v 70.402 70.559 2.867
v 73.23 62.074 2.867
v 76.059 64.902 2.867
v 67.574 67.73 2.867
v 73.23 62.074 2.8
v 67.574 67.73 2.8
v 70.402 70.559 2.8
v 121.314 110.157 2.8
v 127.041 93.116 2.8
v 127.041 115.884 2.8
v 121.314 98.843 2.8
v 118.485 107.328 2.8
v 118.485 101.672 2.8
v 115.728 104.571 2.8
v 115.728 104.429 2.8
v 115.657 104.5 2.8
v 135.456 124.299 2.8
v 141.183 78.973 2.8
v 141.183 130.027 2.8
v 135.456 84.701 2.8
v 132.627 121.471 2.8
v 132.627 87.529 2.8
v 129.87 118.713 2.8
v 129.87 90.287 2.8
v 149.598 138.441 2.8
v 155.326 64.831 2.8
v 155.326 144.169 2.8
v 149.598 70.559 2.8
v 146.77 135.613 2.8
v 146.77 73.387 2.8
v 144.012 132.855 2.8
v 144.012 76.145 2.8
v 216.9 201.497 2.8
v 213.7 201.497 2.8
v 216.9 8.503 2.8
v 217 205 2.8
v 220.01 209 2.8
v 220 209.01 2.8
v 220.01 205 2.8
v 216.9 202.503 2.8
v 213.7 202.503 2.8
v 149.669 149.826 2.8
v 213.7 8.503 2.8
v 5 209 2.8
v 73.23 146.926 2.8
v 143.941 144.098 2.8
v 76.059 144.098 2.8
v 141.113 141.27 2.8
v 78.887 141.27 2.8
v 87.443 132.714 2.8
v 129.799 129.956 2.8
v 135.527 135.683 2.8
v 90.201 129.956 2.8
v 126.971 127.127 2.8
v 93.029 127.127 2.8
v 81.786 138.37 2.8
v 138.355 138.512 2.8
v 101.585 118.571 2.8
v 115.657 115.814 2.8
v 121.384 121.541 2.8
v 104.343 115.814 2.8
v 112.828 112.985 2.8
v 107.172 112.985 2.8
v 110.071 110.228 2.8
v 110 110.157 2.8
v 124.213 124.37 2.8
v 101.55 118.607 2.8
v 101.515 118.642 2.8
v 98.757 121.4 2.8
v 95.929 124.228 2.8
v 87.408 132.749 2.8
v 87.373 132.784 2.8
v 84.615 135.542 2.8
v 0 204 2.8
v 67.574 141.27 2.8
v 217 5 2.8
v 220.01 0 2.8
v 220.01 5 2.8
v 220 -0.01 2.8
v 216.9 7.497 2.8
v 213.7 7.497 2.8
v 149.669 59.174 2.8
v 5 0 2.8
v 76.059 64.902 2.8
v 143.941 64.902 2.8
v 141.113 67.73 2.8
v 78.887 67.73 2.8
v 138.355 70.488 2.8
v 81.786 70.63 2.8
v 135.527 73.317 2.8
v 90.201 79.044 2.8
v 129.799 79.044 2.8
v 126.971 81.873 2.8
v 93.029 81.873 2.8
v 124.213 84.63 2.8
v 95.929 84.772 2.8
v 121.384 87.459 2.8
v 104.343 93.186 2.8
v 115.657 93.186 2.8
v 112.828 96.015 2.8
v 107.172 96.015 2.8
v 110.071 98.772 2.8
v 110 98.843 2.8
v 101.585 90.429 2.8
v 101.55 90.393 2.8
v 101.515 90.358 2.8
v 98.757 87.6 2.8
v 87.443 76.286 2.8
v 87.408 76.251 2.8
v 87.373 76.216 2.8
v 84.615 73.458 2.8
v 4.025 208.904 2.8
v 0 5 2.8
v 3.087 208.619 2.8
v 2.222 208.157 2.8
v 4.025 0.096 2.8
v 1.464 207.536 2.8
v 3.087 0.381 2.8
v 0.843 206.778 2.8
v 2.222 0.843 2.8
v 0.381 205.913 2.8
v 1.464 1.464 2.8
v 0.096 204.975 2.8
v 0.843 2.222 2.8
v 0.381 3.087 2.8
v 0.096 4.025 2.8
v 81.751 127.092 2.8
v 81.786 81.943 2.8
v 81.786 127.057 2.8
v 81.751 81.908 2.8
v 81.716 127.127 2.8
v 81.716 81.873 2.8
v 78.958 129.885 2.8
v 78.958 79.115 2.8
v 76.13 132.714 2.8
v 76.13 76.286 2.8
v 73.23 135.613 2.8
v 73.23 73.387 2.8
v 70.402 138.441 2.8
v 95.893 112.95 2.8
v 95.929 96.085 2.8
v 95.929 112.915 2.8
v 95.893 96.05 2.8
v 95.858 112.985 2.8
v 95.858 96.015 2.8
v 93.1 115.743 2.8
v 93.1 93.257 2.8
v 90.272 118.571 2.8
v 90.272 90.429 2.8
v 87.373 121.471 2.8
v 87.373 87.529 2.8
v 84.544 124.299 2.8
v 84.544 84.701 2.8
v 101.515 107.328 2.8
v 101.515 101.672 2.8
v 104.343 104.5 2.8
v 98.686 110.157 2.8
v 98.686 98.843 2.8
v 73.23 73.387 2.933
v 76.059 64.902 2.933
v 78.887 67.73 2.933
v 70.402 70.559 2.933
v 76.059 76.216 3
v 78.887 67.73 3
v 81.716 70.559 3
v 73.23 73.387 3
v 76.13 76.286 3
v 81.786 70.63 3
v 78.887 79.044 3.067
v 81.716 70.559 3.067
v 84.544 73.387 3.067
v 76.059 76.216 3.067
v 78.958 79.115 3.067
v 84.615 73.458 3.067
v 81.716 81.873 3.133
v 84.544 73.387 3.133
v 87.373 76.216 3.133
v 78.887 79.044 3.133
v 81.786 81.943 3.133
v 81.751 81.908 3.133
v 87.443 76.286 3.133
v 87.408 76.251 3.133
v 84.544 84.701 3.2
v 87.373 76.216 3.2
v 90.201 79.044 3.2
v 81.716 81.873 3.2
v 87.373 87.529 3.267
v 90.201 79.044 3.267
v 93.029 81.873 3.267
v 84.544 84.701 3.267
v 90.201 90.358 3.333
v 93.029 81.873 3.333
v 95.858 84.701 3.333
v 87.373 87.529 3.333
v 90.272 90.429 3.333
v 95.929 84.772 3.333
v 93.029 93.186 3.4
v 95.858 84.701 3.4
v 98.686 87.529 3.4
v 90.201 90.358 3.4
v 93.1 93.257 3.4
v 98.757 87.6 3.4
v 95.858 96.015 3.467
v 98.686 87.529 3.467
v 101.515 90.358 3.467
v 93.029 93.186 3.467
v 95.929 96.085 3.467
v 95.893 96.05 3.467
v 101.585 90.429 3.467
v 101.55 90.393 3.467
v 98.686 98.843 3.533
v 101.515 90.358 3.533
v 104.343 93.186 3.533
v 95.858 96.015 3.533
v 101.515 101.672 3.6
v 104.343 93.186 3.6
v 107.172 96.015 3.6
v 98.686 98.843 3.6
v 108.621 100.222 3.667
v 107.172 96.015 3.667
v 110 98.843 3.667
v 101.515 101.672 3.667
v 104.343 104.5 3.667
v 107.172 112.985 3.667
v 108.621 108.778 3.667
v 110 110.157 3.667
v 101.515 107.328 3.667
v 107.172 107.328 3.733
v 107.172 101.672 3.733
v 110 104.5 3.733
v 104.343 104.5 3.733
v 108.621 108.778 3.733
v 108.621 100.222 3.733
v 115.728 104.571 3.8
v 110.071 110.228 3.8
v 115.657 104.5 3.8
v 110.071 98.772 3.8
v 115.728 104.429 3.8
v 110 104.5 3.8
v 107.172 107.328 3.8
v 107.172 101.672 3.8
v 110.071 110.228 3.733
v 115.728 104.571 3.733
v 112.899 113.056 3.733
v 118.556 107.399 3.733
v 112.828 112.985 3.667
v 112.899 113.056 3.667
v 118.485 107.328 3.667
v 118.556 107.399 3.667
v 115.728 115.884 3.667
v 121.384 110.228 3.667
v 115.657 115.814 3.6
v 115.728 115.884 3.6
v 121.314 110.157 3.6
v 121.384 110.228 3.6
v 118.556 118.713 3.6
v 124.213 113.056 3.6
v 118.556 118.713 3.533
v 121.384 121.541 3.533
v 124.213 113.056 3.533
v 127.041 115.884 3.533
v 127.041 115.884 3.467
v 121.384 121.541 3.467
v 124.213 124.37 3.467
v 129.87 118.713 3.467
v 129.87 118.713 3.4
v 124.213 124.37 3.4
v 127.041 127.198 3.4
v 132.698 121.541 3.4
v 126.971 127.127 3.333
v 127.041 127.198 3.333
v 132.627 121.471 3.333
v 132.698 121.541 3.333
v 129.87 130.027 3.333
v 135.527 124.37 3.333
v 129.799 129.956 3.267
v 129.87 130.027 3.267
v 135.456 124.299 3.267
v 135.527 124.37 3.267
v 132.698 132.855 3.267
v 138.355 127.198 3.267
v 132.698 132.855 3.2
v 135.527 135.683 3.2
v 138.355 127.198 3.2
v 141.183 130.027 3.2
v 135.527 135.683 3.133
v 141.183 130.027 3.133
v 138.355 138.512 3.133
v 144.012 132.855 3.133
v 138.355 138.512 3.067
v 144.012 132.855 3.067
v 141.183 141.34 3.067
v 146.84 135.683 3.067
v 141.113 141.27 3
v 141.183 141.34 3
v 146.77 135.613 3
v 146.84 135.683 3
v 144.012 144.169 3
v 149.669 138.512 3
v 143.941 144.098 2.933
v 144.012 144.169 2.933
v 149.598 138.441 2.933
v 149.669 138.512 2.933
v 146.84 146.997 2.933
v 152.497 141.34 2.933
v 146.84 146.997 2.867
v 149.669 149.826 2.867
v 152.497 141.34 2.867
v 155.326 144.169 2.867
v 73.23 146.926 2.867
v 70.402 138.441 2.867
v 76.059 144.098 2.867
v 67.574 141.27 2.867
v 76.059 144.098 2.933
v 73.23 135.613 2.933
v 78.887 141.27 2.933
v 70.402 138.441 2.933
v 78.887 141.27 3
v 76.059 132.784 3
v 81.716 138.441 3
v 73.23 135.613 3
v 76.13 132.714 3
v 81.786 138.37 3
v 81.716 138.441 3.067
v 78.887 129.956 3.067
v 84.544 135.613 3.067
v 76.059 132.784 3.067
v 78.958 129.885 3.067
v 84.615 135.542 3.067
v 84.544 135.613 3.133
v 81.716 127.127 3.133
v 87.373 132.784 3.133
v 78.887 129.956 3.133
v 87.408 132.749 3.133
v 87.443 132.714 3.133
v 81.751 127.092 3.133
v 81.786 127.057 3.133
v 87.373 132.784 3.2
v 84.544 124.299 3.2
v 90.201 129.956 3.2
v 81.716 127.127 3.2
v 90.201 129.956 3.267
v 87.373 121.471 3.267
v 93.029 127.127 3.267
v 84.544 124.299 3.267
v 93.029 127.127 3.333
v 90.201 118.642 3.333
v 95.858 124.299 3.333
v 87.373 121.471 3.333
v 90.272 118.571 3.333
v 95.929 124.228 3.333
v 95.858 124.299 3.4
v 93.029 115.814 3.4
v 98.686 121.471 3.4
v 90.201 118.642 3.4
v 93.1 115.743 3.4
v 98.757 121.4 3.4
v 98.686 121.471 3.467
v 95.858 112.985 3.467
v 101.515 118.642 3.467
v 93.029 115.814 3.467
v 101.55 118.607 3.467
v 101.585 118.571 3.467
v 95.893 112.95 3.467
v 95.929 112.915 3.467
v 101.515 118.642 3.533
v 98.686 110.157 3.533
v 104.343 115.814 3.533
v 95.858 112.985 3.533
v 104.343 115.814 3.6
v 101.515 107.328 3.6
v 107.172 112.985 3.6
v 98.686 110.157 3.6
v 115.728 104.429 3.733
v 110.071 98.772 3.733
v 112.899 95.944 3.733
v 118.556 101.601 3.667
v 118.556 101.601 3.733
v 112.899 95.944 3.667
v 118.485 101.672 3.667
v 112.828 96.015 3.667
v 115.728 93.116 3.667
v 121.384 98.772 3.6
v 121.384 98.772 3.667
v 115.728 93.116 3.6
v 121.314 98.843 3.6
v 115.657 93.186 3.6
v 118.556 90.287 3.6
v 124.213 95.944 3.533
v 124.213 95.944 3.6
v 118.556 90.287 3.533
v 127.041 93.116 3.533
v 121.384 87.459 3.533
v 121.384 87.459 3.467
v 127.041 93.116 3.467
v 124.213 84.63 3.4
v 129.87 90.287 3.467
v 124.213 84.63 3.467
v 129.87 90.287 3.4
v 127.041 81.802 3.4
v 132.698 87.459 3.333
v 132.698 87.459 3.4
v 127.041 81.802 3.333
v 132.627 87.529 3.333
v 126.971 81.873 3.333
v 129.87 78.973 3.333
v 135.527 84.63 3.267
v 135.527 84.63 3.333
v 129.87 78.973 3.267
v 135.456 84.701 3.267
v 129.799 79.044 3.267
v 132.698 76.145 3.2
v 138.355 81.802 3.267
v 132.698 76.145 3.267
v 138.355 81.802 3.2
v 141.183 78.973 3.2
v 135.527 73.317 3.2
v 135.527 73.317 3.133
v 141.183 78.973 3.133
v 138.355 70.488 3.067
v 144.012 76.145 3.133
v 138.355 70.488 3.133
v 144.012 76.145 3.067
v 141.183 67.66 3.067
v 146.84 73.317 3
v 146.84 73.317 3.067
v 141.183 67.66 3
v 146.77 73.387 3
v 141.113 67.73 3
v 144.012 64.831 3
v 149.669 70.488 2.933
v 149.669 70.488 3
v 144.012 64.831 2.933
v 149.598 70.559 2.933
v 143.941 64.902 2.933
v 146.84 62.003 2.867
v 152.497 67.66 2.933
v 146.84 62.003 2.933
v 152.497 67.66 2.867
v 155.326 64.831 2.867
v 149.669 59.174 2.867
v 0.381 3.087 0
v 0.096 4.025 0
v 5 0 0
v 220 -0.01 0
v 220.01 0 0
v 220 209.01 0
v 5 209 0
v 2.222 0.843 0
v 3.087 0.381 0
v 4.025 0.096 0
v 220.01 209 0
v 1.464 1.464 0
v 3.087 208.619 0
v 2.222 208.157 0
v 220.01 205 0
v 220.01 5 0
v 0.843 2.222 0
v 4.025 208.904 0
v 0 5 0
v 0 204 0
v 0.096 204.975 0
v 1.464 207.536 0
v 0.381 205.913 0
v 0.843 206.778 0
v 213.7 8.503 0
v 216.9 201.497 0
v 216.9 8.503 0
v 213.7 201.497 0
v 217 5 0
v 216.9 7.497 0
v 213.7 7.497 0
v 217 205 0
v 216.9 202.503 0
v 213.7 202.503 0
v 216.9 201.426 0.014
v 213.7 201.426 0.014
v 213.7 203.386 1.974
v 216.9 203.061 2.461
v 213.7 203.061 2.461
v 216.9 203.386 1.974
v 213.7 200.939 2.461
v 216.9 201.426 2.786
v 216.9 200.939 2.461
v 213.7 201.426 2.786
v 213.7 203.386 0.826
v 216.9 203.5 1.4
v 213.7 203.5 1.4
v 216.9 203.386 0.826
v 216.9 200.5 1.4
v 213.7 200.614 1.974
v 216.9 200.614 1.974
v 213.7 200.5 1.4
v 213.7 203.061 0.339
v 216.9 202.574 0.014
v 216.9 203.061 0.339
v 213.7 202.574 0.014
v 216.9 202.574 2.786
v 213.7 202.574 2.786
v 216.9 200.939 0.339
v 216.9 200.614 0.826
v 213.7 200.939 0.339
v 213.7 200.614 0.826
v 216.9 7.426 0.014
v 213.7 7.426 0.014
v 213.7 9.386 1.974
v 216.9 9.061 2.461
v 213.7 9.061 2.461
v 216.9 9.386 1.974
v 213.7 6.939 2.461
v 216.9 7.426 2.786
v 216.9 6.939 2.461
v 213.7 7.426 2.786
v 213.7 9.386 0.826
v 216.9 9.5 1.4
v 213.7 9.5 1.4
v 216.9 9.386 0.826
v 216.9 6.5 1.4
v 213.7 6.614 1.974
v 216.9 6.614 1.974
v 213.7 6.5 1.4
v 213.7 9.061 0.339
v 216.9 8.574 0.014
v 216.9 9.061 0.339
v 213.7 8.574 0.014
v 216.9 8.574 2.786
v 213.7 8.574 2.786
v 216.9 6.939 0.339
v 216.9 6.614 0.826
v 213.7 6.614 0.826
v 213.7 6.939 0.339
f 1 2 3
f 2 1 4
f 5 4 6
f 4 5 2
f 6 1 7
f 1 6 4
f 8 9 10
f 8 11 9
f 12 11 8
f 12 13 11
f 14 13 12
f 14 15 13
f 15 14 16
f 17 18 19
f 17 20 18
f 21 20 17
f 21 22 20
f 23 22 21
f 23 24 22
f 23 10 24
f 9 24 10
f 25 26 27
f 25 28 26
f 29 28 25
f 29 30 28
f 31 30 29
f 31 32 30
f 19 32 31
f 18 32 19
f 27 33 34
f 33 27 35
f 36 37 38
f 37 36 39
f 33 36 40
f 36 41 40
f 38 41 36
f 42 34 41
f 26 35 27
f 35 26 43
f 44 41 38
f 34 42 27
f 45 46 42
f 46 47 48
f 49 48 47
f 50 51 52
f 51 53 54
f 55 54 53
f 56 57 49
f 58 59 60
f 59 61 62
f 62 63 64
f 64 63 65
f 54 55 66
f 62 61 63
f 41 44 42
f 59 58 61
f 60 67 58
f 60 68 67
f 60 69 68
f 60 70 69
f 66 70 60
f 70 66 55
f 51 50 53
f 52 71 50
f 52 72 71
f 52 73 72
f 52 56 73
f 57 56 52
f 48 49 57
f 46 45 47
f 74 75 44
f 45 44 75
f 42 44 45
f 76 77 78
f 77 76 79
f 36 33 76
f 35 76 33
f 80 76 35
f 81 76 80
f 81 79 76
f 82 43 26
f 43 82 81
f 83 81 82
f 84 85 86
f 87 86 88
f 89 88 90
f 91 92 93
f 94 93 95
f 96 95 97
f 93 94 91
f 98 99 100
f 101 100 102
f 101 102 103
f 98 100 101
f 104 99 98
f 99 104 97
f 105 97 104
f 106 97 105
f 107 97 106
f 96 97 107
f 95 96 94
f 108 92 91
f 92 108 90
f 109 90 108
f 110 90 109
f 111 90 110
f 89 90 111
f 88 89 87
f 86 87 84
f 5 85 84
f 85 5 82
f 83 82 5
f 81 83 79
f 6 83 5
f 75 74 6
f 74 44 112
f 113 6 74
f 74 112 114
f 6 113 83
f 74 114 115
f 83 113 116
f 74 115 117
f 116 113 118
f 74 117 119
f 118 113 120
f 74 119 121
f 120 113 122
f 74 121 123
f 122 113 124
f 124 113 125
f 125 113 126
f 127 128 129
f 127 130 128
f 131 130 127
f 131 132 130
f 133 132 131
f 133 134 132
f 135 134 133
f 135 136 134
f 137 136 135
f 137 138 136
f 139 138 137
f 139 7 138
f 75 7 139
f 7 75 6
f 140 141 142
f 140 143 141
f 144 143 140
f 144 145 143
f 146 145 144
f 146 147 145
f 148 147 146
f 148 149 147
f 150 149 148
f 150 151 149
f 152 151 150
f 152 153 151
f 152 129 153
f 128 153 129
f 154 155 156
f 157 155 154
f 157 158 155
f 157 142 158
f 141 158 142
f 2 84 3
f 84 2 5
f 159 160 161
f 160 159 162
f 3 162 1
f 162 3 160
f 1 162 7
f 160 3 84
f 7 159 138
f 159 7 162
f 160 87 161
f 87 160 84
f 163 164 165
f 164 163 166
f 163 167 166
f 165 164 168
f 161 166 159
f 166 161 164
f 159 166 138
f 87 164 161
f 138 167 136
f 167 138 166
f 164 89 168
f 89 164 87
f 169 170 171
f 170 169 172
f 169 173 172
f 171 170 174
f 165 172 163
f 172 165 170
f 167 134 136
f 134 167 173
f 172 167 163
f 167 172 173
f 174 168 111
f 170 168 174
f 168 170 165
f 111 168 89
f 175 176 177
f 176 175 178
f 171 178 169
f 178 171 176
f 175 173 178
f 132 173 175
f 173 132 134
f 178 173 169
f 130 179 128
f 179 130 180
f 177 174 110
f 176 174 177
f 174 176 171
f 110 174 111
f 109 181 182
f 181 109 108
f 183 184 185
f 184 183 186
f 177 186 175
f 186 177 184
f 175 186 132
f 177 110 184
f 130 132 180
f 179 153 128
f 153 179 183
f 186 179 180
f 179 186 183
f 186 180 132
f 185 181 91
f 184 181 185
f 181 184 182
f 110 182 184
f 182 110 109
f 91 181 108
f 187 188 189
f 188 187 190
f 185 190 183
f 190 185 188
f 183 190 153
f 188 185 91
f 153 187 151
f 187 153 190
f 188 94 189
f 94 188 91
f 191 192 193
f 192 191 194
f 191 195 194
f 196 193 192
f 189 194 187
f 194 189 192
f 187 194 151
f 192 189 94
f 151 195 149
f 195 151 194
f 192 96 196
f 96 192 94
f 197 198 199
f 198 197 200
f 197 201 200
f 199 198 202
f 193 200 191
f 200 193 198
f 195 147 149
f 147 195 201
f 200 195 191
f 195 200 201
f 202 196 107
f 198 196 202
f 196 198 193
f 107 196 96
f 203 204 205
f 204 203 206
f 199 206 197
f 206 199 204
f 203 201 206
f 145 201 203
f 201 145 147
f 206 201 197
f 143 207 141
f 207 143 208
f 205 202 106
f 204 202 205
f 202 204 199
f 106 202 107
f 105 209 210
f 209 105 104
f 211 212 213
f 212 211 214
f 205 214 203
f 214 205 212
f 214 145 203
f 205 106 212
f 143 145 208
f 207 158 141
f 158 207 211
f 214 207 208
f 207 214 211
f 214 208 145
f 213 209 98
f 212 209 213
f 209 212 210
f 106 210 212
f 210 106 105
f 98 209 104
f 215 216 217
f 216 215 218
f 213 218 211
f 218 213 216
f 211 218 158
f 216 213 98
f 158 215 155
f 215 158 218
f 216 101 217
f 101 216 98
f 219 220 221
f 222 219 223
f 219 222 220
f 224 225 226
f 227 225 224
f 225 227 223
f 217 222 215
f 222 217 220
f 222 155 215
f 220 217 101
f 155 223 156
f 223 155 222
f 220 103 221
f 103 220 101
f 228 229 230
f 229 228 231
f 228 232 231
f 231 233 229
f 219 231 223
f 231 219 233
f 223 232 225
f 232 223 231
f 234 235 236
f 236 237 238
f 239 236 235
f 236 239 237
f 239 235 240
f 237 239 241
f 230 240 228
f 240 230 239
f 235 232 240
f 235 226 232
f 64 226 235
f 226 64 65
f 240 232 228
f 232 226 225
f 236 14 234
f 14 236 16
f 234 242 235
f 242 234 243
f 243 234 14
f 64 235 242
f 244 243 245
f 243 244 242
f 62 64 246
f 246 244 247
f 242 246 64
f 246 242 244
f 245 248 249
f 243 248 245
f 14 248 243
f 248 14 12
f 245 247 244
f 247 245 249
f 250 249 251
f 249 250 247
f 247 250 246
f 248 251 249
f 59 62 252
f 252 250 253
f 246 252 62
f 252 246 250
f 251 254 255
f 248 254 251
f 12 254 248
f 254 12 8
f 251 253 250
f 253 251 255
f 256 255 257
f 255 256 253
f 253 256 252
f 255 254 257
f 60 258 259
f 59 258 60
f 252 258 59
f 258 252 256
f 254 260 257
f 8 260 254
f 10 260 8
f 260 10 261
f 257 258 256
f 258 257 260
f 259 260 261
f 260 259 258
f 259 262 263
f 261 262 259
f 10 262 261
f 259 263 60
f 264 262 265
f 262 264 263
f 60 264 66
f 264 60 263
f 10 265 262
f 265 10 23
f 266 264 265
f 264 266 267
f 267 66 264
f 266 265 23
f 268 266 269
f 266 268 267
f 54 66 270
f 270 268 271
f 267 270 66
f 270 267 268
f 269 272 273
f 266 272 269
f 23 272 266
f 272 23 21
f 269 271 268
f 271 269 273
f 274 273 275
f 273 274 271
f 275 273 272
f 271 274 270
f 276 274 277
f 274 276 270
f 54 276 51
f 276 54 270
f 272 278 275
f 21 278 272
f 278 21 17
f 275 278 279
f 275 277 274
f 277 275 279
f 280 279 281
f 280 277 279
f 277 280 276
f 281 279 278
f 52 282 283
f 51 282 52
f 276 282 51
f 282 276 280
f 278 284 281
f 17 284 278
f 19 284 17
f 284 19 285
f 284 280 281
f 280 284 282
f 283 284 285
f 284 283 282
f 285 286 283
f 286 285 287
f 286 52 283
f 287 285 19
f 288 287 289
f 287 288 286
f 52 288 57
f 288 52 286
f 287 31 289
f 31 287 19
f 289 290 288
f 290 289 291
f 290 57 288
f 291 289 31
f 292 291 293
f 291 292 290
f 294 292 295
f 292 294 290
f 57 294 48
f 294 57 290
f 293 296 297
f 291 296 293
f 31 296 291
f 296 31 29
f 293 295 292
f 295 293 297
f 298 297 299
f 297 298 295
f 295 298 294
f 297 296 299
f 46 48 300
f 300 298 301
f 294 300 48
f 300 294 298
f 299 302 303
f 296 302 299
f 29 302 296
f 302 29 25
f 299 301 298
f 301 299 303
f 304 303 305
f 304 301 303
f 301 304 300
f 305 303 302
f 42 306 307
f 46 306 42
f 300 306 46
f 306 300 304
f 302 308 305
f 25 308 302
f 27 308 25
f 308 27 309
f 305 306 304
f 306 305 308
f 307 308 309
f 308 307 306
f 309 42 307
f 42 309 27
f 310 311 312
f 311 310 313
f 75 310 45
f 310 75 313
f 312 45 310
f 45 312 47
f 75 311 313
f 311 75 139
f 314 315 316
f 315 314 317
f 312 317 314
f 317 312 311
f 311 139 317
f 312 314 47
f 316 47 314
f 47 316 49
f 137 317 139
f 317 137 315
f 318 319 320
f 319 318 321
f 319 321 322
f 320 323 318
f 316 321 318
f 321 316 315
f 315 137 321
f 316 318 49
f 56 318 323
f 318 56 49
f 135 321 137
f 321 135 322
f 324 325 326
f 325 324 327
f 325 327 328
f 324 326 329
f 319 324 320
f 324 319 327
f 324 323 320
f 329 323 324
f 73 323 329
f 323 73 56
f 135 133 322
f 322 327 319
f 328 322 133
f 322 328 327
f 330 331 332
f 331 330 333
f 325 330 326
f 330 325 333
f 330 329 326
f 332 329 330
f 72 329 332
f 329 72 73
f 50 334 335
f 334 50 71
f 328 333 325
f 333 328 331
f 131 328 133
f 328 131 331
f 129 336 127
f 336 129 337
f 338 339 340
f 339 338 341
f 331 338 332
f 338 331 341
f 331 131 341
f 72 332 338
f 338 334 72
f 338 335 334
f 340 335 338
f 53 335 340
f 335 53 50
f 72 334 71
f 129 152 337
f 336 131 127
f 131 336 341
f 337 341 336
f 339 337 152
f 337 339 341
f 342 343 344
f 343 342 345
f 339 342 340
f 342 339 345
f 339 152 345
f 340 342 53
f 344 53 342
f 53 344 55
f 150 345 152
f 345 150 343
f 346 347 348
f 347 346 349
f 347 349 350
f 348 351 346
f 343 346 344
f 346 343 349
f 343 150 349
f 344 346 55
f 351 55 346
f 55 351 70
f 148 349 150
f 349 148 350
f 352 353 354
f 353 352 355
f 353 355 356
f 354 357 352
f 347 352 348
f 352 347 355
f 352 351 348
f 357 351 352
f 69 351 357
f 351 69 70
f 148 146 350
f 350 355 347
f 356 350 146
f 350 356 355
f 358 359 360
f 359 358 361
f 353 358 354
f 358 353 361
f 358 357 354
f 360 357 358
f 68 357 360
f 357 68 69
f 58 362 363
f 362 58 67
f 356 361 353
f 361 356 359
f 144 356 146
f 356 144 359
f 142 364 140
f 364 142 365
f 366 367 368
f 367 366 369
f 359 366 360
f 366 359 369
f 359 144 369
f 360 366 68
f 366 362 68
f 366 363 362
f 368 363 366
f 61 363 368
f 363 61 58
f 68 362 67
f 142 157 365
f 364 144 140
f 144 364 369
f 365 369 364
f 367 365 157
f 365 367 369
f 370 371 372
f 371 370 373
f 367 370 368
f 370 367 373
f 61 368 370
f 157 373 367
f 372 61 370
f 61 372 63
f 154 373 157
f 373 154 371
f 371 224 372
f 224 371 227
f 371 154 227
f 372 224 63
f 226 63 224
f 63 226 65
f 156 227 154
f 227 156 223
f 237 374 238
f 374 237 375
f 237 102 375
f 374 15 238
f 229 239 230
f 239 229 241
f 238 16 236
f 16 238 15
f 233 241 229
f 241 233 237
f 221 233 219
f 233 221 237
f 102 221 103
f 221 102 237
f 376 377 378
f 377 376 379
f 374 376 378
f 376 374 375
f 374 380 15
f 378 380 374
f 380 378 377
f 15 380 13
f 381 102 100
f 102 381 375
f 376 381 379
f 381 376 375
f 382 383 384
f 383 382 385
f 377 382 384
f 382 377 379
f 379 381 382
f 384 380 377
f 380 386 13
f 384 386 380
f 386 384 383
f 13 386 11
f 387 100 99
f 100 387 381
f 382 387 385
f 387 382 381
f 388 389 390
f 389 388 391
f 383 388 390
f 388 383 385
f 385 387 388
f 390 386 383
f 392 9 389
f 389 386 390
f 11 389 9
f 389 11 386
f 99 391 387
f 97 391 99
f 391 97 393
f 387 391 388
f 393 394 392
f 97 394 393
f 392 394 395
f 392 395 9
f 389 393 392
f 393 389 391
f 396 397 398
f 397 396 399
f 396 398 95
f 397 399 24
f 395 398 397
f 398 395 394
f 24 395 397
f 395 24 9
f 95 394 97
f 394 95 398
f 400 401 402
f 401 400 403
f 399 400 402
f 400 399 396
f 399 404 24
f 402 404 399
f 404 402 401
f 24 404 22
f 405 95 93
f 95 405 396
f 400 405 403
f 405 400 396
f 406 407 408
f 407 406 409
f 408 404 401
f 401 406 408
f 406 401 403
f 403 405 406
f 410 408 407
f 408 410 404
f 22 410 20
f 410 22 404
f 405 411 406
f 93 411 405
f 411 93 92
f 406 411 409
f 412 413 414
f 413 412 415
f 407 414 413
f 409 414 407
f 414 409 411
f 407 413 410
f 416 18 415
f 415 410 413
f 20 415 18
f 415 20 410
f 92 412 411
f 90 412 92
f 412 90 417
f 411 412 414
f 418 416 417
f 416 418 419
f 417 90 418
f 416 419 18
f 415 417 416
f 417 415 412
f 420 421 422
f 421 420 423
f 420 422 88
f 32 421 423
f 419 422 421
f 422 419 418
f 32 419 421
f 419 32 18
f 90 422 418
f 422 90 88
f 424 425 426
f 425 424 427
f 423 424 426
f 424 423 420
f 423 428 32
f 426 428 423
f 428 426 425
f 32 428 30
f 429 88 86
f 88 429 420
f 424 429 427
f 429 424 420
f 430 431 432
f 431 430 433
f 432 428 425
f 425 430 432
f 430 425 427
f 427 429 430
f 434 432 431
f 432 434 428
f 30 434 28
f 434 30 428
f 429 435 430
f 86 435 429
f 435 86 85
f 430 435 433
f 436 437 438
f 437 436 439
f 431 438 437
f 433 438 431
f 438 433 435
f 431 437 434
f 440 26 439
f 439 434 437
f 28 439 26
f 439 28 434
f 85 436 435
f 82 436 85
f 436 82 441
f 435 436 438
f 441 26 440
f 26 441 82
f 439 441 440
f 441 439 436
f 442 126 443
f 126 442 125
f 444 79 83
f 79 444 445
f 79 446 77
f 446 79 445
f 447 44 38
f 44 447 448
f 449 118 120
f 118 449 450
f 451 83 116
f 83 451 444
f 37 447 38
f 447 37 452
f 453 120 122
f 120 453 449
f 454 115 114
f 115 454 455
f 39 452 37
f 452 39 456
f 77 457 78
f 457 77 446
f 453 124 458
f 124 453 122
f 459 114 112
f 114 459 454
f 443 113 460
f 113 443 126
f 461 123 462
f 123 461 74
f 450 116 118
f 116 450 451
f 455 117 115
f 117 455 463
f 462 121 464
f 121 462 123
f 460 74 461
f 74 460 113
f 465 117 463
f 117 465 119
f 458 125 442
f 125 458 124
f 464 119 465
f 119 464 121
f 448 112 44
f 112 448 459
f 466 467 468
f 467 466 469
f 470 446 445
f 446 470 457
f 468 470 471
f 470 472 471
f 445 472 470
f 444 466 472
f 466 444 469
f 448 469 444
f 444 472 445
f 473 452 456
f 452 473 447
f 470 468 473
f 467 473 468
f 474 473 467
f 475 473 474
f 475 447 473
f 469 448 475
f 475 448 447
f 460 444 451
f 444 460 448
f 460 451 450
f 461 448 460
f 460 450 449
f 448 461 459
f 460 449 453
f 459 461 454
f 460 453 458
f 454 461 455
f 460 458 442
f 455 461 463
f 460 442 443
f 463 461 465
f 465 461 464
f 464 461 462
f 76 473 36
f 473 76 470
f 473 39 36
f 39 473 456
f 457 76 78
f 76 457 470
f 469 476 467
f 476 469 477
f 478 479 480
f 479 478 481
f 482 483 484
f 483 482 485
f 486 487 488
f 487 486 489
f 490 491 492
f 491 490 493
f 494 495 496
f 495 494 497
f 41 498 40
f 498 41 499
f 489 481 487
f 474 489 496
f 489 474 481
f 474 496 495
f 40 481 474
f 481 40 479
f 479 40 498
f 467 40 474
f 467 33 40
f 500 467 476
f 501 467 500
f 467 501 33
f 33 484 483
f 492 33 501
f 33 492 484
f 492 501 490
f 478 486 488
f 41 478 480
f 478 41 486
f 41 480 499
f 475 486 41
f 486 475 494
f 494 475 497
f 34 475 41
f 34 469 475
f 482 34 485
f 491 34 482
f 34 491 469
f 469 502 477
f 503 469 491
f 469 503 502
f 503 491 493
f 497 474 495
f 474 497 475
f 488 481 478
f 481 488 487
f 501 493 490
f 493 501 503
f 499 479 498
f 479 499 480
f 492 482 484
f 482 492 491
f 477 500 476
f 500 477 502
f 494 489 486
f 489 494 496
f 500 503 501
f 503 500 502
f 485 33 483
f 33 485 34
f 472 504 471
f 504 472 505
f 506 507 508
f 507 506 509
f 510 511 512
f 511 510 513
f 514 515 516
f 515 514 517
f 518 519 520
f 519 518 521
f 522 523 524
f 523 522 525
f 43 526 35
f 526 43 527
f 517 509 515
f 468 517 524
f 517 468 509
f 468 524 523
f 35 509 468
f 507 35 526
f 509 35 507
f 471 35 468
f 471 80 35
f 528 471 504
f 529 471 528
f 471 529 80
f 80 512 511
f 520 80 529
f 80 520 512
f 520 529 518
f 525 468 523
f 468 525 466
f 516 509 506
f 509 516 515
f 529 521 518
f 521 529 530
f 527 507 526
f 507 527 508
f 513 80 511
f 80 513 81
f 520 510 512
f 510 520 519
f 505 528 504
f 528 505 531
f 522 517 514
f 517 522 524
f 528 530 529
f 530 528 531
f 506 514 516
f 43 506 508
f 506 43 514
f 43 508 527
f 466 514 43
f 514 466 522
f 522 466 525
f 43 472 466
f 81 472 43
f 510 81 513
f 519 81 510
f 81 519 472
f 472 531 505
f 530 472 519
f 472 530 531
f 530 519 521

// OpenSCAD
// A部分：220mm × 209mm × 2.8mm
// 滑槽式拼接 - 前后方向滑槽
// 滑槽深度方向：从前向后

// 参数
width = 220;     // 宽度 (mm)
height = 209;    // 高度 (mm)
thickness = 2.8; // 厚度 (mm)
corner_radius = 5;  // 倒角半径 (mm)

// 滑槽参数
slot_depth = 3;       // 槽深度 (mm，从右向左)
slot_height = 3;      // 槽高度 (mm)
slot_length = 200;    // 槽长度 (mm，从前向后)
slot_offset_front = 5; // 槽距离前面 (mm)
slot_offset_top = 10;  // 槽距离上边缘 (mm)

// 定位销参数
pin_radius = 1.5;
pin_depth = 3;

// X 图案参数
x_max_height = 1.0;
x_width = 8;
x_diagonal = 120;

// 圆角矩形模块（右侧不倒角）
module rounded_rect_right_flat(w, h, r, t) {
    hull() {
        translate([r, r, 0]) cylinder(h = t, r = r, $fn = 32);
        translate([r, h - r, 0]) cylinder(h = t, r = r, $fn = 32);
        translate([w, h, 0]) cylinder(h = t, r = 0.01, $fn = 4);
        translate([w, 0, 0]) cylinder(h = t, r = 0.01, $fn = 4);
    }
}

// 创建主体
difference() {
    union() {
        // 面板主体
        color("LightGray") {
            rounded_rect_right_flat(width, height, corner_radius, thickness);
        }

        // X 图案
        color("DarkGray") {
            translate([width/2, height/2, 0])
            x_pattern();
        }
    }

    // 滑槽（在右侧，从前向后）
    color("Red") {
        // 主滑槽
        translate([width - slot_depth, slot_offset_front, -0.1])
        cube([slot_depth + 0.2, slot_length, slot_height + 0.2]);

        // 后面定位孔（防止滑出）
        translate([width - slot_depth - 0.1, slot_offset_front + slot_length - pin_depth, thickness/2])
        rotate([0, -90, 0])
        cylinder(h = slot_depth + 0.2, r = pin_radius, $fn = 16);

        // 前面定位孔（防止滑出）
        translate([width - slot_depth - 0.1, slot_offset_front + pin_depth, thickness/2])
        rotate([0, -90, 0])
        cylinder(h = slot_depth + 0.2, r = pin_radius, $fn = 16);
    }
}

// X 图案模块
module x_pattern() {
    segments = 30;
    segment_length = x_diagonal / segments;

    union() {
        for (i = [-segments/2:segments/2-1]) {
            dist_ratio = abs(i) / (segments/2);
            current_height = x_max_height * (1 - dist_ratio);

            translate([0, 0, thickness])
            rotate([0, 0, 45])
            translate([i * segment_length, -x_width/2, 0])
            cube([segment_length + 0.1, x_width, current_height]);
        }

        for (i = [-segments/2:segments/2-1]) {
            dist_ratio = abs(i) / (segments/2);
            current_height = x_max_height * (1 - dist_ratio);

            translate([0, 0, thickness])
            rotate([0, 0, -45])
            translate([i * segment_length, -x_width/2, 0])
            cube([segment_length + 0.1, x_width, current_height]);
        }
    }
}
